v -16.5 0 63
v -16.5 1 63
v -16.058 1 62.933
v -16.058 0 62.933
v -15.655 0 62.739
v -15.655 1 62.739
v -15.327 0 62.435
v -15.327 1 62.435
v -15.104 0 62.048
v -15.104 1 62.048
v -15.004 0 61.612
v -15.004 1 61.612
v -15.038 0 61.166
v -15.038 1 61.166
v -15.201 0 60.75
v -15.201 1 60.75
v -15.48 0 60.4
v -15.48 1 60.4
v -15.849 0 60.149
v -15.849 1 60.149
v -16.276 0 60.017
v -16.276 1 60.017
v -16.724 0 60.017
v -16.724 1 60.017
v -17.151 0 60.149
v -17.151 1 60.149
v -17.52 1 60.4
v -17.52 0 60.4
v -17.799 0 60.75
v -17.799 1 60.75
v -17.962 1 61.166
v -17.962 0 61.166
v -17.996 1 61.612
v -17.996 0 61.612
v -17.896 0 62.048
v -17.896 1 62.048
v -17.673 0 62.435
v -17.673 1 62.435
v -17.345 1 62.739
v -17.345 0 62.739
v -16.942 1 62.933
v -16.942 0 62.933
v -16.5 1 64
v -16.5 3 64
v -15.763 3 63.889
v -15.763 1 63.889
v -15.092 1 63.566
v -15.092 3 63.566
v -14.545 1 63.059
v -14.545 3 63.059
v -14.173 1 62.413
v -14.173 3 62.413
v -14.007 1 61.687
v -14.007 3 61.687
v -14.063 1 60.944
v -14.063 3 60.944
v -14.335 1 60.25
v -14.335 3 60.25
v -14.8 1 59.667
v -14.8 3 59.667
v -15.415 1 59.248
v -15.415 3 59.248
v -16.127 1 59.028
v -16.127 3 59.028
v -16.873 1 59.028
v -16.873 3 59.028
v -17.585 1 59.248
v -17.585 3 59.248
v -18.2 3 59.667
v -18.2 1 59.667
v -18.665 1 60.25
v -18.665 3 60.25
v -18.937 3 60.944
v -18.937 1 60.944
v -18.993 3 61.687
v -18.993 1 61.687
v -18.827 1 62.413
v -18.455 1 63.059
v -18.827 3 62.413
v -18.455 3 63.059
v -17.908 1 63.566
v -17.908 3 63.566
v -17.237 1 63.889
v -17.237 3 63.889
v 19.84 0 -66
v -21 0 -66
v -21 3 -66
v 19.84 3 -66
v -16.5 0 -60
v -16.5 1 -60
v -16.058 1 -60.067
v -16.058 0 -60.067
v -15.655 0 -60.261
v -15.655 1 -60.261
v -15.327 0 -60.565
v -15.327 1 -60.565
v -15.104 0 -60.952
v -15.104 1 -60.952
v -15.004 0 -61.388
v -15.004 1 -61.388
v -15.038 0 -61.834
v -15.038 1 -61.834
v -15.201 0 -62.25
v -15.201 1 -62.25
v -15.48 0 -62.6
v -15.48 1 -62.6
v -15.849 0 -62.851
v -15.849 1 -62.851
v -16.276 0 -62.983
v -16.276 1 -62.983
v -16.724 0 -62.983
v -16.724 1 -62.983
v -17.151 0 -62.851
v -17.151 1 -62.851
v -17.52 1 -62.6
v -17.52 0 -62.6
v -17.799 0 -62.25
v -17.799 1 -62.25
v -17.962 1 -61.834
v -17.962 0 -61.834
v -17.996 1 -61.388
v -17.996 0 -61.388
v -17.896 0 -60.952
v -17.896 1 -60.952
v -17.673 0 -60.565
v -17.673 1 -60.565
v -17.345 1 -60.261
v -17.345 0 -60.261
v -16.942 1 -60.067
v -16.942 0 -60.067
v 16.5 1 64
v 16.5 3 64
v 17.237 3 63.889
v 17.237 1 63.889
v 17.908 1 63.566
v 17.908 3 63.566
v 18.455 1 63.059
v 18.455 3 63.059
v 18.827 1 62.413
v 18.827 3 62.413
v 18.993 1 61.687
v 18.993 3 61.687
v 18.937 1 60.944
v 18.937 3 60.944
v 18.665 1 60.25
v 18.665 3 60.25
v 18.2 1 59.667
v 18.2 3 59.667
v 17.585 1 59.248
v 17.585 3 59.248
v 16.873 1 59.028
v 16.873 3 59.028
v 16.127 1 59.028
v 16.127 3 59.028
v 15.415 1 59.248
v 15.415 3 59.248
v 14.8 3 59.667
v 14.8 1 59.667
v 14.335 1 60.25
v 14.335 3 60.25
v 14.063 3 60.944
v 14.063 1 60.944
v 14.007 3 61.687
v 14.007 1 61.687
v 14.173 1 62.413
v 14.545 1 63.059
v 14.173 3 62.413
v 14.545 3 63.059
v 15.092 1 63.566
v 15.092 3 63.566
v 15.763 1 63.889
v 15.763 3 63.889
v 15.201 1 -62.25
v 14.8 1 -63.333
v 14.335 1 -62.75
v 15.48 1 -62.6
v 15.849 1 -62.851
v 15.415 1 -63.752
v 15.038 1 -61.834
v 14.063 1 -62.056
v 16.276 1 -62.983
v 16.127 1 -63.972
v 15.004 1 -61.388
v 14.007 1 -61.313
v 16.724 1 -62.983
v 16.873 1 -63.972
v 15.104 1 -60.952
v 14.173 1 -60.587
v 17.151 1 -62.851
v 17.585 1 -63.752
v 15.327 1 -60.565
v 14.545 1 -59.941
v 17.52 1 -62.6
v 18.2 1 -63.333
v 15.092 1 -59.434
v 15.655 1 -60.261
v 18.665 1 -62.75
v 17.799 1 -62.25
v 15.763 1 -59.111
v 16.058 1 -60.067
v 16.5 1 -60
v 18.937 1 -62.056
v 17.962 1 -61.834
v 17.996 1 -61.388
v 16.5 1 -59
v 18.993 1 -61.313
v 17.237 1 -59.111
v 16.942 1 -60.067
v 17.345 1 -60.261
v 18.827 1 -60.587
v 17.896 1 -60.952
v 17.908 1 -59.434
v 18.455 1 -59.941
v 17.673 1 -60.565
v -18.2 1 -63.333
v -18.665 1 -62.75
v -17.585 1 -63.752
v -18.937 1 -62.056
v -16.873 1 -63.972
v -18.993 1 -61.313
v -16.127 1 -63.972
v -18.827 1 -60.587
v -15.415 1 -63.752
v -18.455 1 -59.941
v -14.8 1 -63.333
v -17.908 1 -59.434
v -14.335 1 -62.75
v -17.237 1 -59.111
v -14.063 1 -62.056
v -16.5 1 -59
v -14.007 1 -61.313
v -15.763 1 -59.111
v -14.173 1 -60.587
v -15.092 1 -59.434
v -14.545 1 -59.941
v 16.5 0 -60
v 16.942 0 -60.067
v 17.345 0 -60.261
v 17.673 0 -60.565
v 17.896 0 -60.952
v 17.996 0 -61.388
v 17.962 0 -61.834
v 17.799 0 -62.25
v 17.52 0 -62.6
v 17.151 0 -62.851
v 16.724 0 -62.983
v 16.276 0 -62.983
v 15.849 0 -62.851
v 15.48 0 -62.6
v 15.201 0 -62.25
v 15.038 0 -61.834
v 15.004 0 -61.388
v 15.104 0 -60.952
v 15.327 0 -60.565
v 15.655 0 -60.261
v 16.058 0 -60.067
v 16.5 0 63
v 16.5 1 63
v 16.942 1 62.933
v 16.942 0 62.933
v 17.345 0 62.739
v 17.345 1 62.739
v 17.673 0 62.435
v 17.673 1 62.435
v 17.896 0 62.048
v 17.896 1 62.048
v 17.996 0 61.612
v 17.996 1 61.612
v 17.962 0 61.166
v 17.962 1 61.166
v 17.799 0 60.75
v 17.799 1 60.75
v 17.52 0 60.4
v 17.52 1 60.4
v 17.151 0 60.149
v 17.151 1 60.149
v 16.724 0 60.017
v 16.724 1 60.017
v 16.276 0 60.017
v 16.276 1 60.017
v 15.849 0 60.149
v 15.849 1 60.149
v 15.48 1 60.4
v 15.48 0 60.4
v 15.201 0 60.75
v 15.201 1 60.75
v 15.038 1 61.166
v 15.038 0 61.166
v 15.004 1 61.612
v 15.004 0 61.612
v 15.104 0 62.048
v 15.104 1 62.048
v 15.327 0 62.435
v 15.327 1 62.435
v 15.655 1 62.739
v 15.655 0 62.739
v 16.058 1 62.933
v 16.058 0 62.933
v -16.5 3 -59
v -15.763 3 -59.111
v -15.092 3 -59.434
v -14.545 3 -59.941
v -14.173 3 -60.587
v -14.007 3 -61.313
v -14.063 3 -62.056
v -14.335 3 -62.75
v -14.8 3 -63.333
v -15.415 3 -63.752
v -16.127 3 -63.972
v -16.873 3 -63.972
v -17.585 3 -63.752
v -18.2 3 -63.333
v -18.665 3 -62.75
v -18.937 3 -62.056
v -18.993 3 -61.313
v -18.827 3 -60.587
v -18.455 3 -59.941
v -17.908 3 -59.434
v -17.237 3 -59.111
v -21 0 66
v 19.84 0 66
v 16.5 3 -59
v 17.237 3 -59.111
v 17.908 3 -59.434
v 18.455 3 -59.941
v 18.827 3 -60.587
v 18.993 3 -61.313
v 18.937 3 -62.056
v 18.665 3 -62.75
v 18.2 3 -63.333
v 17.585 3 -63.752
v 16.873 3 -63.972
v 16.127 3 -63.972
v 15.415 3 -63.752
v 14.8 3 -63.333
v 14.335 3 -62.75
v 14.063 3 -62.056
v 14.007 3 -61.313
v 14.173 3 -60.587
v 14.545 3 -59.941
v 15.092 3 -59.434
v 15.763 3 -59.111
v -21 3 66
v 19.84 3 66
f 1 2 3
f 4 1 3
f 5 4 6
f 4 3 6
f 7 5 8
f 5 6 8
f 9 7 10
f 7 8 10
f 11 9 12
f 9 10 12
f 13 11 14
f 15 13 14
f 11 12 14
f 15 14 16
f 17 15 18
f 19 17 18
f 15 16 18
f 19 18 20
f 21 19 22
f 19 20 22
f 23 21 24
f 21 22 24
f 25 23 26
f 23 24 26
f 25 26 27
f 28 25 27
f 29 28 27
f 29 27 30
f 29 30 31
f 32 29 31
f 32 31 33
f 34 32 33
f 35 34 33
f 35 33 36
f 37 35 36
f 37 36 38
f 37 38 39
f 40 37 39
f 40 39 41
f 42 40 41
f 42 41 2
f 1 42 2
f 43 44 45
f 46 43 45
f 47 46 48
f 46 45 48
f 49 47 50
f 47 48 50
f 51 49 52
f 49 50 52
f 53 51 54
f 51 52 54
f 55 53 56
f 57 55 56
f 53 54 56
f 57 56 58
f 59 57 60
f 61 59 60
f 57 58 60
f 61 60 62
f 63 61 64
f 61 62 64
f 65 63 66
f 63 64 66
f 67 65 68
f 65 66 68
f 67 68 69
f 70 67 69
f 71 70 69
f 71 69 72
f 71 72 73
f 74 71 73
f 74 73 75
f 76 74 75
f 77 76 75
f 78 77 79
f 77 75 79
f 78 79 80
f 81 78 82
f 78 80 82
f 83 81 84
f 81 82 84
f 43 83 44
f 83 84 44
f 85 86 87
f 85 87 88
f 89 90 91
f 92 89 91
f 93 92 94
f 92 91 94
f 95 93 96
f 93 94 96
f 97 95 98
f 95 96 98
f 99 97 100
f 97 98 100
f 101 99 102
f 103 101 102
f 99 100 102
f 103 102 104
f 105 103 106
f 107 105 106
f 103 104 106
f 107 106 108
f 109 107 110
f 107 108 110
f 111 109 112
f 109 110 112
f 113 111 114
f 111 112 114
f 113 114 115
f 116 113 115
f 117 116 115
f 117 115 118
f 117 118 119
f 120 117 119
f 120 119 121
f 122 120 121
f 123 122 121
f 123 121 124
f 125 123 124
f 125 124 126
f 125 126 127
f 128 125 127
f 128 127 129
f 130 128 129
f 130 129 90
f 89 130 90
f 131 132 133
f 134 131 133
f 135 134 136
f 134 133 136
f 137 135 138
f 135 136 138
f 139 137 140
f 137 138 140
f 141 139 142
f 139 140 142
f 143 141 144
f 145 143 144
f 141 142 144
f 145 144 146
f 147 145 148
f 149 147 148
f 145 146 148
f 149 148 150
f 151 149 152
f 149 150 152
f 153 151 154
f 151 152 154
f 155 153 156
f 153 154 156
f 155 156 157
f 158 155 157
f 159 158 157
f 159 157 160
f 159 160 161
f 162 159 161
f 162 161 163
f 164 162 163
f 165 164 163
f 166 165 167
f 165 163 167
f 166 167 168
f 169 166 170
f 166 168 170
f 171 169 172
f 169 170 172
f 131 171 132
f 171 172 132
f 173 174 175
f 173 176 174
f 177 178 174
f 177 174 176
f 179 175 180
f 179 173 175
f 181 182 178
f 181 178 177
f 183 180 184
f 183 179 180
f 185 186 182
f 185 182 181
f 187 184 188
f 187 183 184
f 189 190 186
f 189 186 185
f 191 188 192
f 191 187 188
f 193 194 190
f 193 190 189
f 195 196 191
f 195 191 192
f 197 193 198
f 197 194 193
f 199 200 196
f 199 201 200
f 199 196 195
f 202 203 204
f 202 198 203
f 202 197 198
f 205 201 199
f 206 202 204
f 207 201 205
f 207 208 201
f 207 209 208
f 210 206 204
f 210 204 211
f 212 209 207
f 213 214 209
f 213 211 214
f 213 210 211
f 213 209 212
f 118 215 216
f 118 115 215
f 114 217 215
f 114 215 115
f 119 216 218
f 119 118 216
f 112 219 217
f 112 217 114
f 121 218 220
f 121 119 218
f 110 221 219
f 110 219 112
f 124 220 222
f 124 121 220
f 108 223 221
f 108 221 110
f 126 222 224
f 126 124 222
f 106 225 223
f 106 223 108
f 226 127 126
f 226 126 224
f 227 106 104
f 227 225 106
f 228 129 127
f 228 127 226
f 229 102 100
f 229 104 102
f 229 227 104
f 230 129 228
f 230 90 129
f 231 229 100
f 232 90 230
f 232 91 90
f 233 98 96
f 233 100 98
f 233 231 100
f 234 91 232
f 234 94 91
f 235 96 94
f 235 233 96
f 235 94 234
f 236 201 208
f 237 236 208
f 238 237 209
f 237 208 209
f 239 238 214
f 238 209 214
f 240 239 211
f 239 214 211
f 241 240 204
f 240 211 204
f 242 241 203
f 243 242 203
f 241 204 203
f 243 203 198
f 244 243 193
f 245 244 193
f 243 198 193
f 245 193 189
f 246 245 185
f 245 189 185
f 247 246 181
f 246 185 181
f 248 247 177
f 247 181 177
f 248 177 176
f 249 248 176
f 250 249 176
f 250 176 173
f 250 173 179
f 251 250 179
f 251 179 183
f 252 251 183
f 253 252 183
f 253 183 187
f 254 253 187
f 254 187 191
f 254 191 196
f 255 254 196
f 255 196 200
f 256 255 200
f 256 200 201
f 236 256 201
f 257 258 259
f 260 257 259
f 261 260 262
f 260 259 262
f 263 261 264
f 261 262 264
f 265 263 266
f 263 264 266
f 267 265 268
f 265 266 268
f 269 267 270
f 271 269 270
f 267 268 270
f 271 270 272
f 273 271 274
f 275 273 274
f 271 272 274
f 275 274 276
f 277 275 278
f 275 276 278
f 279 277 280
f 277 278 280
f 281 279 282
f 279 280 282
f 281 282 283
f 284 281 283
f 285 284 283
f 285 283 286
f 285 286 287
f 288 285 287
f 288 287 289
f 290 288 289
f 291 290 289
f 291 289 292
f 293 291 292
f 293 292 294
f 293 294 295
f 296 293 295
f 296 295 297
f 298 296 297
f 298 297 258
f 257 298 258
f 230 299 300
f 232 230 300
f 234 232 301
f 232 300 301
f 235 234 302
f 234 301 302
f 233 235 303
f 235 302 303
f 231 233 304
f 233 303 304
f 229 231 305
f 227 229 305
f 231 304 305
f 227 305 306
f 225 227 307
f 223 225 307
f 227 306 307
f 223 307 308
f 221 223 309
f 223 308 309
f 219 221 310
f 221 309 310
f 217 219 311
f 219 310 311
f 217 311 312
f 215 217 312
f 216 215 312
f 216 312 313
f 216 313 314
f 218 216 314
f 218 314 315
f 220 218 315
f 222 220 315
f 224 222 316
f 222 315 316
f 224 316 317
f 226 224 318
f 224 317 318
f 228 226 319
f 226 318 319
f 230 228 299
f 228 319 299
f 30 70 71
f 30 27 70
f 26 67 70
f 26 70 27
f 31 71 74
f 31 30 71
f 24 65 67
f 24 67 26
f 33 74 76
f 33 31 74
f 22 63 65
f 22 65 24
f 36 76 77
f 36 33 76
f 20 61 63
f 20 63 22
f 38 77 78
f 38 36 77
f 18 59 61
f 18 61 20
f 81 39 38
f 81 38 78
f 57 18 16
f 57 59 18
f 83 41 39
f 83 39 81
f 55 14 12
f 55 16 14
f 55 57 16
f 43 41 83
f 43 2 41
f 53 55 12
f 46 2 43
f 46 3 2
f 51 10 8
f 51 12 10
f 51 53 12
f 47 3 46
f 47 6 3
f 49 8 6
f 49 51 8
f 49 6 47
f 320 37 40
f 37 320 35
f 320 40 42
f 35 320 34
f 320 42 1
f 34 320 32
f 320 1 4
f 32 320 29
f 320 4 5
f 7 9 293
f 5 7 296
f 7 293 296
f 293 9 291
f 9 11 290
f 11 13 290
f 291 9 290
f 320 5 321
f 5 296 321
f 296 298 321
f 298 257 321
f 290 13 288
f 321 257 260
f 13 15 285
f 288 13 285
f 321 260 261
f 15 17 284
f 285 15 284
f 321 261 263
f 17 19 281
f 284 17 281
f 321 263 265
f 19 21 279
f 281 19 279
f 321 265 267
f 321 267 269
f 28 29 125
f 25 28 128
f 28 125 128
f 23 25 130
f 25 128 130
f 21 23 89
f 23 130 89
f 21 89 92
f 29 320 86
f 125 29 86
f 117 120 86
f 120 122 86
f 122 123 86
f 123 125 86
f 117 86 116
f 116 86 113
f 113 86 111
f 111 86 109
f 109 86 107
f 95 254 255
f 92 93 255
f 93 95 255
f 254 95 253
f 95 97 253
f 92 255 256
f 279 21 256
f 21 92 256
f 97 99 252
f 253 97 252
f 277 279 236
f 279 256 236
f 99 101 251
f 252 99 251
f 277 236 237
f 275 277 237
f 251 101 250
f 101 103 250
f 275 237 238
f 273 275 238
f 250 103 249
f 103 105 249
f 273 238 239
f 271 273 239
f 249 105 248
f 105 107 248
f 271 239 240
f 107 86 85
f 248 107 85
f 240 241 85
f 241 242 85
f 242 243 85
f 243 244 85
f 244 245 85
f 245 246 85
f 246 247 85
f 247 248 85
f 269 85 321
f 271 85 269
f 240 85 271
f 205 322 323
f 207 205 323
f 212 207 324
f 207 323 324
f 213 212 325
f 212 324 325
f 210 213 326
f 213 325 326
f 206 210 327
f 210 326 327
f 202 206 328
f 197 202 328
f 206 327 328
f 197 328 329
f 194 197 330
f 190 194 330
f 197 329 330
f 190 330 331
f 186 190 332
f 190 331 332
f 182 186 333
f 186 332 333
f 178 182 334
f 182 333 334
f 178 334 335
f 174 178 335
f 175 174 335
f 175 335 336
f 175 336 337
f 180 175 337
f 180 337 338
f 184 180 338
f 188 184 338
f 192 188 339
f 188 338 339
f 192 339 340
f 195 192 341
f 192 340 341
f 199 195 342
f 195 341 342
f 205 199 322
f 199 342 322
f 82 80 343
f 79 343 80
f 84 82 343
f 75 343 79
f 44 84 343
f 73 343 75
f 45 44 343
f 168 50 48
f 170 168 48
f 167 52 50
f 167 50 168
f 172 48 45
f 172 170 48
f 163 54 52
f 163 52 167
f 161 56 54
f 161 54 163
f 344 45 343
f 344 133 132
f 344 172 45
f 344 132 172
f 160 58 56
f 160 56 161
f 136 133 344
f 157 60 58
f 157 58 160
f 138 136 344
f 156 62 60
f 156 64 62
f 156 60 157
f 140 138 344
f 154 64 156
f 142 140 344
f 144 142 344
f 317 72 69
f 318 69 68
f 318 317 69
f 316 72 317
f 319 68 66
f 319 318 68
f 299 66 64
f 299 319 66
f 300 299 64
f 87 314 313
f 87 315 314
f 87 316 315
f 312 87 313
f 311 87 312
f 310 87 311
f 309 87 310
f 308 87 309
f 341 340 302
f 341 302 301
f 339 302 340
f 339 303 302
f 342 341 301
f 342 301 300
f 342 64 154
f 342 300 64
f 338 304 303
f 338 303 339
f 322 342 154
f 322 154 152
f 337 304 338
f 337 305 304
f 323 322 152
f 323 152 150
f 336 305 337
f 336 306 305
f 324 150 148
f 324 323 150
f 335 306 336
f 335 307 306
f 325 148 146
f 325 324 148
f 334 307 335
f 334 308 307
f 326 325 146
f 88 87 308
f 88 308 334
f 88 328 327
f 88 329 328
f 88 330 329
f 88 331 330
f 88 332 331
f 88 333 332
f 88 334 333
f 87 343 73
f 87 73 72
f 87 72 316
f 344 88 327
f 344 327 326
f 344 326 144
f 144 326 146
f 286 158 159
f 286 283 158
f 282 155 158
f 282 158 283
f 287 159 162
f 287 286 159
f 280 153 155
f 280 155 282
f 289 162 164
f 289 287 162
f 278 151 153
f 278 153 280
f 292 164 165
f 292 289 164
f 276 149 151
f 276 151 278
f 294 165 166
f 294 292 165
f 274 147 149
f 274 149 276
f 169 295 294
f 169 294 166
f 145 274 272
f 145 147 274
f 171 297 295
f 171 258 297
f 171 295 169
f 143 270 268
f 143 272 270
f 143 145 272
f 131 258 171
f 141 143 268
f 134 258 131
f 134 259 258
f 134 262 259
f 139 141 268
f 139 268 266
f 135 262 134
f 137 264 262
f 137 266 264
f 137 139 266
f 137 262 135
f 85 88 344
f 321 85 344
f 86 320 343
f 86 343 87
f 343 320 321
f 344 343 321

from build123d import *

# Parameters (mm, degrees)
SKETCH1_W           = 42
SKETCH1_H           = 132
BOSS_EXTRUDE1_DEPTH = 3
SKETCH2_R           = 2.5
CUT_EXTRUDE1_DEPTH  = 2
SKETCH3_R           = 1.5
CUT_EXTRUDE2_DEPTH  = 70.289248805
CUT_EXTRUDE3_DEPTH  = 70.32532005


with BuildPart() as part:
    # Sketch1 → Boss-Extrude1 (new body)
    with BuildSketch(Plane(origin=(0, 0, 0), x_dir=(1, 0, 0), z_dir=(0, 1, 0))):
        Rectangle(SKETCH1_W, SKETCH1_H)
    extrude(amount=BOSS_EXTRUDE1_DEPTH)

    # Sketch2 → Cut-Extrude1 (cut)
    with BuildSketch(Plane(origin=(0, 3, 0), x_dir=(1, 0, 0), z_dir=(0, 1, 0))):
        with Locations(Location((-16.5, 61.5, 0), (0, 0, 270))):
            Circle(SKETCH2_R)
        with Locations(Location((16.5, 61.5, 0), (0, 0, 270))):
            Circle(SKETCH2_R)
        with Locations(Location((16.5, -61.5, 0), (0, 0, 270))):
            Circle(SKETCH2_R)
        with Locations(Location((-16.5, -61.5, 0), (0, 0, 270))):
            Circle(SKETCH2_R)
    extrude(amount=-CUT_EXTRUDE1_DEPTH, mode=Mode.SUBTRACT)

    # Sketch3 → Cut-Extrude2 (cut, through all)
    with BuildSketch(Plane(origin=(0, 1, 0), x_dir=(1, 0, 0), z_dir=(0, 1, 0))):
        with Locations(Location((-16.5, 61.5, 0), (0, 0, 270))):
            Circle(SKETCH3_R)
        with Locations(Location((16.5, 61.5, 0), (0, 0, 270))):
            Circle(SKETCH3_R)
        with Locations(Location((16.5, -61.5, 0), (0, 0, 270))):
            Circle(SKETCH3_R)
        with Locations(Location((-16.5, -61.5, 0), (0, 0, 270))):
            Circle(SKETCH3_R)
    extrude(amount=-CUT_EXTRUDE2_DEPTH, mode=Mode.SUBTRACT)

    # Sketch4 → Cut-Extrude3 (cut, through all)
    with BuildSketch(Plane(origin=(0, 3, 0), x_dir=(1, 0, 0), z_dir=(0, 1, 0))):
        Polygon((21, -353.041513135), (21, -66), (21, 66), (19.84024034, 66), (19.84024034, -66), (19.84024034, -353.041513135), (19.84024034, -927.124539404), (21, -927.124539404), align=None)
    extrude(amount=-CUT_EXTRUDE3_DEPTH, mode=Mode.SUBTRACT)


solid = part.part
